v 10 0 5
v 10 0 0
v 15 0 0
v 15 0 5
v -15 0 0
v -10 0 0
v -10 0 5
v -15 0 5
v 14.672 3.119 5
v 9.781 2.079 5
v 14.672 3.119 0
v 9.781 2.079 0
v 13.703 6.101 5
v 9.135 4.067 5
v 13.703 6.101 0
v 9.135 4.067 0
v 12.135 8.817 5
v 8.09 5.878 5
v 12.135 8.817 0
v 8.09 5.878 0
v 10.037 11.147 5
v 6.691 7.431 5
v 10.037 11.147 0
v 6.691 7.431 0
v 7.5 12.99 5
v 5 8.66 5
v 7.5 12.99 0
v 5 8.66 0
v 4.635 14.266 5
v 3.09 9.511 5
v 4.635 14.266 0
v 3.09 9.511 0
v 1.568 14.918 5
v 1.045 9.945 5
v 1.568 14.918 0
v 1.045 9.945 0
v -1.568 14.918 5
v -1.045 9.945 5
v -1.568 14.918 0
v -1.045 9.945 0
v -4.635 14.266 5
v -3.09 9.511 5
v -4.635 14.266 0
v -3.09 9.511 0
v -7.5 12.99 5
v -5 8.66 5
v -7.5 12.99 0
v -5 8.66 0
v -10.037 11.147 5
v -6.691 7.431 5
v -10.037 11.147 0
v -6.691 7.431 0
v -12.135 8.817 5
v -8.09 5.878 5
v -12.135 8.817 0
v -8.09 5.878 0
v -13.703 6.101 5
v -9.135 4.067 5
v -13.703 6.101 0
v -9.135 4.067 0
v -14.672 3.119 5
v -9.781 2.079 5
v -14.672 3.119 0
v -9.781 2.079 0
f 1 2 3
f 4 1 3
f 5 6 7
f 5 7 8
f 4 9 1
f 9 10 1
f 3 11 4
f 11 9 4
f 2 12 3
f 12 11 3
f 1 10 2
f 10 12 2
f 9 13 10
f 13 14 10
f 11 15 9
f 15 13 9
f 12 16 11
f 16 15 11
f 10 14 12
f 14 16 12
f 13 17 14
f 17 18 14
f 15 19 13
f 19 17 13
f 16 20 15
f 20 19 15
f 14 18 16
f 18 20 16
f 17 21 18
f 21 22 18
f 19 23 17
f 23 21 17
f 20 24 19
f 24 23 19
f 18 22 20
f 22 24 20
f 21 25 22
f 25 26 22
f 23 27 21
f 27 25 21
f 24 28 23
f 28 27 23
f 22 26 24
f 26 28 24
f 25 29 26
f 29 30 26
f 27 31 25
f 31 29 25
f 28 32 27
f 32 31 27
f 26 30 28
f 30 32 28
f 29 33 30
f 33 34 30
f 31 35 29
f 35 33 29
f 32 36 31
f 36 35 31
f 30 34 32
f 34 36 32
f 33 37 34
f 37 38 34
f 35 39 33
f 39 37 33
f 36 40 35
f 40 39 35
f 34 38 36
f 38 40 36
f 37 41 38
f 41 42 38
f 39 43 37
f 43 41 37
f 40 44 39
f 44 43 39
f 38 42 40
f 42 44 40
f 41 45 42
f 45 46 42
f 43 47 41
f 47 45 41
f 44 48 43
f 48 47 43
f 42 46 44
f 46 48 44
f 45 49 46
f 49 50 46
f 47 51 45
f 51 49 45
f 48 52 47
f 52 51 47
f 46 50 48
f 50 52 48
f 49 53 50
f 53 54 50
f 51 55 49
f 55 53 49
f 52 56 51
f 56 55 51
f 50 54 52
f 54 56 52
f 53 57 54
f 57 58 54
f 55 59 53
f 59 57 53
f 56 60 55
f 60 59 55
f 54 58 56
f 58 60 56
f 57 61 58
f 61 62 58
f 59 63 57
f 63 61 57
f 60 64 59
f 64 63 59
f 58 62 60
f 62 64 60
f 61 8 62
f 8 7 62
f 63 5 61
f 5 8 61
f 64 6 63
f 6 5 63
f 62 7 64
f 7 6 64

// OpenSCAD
rotate_extrude(angle=180)
    translate([10, 0])
        square(5);
